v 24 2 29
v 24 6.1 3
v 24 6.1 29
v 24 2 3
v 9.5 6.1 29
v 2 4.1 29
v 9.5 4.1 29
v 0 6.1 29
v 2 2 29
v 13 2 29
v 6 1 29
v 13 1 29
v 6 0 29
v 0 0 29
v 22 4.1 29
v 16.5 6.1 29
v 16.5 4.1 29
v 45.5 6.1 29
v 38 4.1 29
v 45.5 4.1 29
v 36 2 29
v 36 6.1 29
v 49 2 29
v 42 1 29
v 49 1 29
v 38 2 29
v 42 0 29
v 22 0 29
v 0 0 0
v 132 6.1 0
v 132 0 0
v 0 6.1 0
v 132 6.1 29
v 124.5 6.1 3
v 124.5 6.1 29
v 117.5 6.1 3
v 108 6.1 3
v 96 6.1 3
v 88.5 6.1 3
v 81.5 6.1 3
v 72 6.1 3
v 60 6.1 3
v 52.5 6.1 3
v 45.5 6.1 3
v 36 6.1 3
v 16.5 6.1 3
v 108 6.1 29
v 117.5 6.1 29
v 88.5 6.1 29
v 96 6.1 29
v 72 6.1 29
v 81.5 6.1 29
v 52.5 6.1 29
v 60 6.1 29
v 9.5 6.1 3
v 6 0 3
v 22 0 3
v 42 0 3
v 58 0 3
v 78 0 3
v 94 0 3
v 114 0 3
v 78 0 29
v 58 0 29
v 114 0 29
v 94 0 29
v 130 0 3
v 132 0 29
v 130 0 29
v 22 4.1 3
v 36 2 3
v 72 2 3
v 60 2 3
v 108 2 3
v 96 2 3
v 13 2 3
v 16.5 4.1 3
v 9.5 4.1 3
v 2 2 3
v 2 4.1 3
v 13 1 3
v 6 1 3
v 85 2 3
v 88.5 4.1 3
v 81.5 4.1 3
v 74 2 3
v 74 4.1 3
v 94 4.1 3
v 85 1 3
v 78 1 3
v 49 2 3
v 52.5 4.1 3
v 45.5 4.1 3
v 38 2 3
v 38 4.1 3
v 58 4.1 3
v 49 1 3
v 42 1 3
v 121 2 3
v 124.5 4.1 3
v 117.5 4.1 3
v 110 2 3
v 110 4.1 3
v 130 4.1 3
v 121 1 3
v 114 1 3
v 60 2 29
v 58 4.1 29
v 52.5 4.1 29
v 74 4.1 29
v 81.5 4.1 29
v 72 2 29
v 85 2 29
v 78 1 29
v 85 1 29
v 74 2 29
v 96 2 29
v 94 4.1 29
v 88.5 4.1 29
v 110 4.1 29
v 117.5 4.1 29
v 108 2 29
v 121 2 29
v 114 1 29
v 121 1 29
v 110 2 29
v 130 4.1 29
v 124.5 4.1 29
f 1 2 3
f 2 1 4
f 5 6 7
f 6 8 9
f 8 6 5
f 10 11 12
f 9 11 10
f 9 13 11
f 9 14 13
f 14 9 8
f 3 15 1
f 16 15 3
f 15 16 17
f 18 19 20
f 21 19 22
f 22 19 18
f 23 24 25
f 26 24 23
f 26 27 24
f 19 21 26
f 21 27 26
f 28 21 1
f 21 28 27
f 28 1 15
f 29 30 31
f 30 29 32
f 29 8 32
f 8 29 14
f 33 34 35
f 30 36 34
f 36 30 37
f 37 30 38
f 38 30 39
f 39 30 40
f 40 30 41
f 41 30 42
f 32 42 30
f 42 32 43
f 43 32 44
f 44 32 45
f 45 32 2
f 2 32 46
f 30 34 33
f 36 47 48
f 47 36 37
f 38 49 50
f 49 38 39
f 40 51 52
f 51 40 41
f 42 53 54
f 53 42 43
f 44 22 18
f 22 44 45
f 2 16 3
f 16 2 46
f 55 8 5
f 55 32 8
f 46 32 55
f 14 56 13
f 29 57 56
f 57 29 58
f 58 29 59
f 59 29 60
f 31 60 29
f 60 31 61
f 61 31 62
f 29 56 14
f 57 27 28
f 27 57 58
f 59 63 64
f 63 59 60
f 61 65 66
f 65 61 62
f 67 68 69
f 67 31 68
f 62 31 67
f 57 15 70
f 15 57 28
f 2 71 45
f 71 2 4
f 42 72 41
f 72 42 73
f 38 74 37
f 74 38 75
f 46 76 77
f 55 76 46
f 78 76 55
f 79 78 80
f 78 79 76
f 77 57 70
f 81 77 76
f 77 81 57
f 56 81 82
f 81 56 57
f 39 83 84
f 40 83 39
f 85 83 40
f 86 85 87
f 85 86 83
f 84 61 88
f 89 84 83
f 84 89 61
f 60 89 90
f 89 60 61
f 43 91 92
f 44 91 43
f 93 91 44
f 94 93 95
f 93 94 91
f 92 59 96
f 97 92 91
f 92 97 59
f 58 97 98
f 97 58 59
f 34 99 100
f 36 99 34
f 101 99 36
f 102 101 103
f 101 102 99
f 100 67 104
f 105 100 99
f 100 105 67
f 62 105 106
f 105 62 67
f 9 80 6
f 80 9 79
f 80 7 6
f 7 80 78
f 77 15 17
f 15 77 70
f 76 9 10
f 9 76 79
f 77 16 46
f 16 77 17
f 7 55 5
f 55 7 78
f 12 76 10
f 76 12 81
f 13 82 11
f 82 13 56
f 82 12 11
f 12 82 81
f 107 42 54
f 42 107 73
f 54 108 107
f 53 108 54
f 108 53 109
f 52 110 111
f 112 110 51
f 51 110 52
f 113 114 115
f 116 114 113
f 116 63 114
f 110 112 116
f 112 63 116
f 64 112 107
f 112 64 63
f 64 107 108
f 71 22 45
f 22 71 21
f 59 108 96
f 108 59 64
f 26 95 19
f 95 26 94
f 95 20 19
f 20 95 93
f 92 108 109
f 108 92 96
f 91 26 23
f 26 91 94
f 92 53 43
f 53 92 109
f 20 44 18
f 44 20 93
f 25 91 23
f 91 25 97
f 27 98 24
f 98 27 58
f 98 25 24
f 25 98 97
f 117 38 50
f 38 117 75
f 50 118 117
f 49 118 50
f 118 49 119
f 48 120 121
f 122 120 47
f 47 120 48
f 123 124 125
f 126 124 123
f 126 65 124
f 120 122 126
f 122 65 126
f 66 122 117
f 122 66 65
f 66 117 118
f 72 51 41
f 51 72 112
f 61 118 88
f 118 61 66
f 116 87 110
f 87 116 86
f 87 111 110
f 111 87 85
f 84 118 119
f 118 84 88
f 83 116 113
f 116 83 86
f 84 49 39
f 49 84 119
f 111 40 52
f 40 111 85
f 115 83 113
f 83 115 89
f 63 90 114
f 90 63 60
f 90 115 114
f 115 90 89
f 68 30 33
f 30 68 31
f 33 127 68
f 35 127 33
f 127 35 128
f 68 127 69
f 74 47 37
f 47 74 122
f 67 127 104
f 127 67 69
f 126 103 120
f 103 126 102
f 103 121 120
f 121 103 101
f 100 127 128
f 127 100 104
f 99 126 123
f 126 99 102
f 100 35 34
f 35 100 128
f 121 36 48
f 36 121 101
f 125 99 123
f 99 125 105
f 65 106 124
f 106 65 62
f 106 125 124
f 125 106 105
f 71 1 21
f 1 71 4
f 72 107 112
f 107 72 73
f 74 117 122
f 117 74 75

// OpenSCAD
    piso = 3;
    altura = 26;
    alturaTotal = altura + piso;
    
module cam() {

    difference () {
        cube ([24,6.1,alturaTotal]);
        translate ([2,2,piso])
        cube ([20,2.1,altura]);
        translate ([9.5,4,piso])
        cube ([7,2.2,altura]);
        translate ([13,0,piso])
        cube ([9,2.2,altura]);
        translate ([13-7,0,piso])
        cube ([9,1,altura]);   
    }
}


union() {
    cube([36*4 - 12, 6.1, piso]);
    for (a =[0:3]) {
        translate([36*a,0,0])
        cam();
    }
    for (a =[0:2]) {
        translate([a*36 + 24, 0, 0])
        cube([36-24, 2, alturaTotal]);
    }
}
